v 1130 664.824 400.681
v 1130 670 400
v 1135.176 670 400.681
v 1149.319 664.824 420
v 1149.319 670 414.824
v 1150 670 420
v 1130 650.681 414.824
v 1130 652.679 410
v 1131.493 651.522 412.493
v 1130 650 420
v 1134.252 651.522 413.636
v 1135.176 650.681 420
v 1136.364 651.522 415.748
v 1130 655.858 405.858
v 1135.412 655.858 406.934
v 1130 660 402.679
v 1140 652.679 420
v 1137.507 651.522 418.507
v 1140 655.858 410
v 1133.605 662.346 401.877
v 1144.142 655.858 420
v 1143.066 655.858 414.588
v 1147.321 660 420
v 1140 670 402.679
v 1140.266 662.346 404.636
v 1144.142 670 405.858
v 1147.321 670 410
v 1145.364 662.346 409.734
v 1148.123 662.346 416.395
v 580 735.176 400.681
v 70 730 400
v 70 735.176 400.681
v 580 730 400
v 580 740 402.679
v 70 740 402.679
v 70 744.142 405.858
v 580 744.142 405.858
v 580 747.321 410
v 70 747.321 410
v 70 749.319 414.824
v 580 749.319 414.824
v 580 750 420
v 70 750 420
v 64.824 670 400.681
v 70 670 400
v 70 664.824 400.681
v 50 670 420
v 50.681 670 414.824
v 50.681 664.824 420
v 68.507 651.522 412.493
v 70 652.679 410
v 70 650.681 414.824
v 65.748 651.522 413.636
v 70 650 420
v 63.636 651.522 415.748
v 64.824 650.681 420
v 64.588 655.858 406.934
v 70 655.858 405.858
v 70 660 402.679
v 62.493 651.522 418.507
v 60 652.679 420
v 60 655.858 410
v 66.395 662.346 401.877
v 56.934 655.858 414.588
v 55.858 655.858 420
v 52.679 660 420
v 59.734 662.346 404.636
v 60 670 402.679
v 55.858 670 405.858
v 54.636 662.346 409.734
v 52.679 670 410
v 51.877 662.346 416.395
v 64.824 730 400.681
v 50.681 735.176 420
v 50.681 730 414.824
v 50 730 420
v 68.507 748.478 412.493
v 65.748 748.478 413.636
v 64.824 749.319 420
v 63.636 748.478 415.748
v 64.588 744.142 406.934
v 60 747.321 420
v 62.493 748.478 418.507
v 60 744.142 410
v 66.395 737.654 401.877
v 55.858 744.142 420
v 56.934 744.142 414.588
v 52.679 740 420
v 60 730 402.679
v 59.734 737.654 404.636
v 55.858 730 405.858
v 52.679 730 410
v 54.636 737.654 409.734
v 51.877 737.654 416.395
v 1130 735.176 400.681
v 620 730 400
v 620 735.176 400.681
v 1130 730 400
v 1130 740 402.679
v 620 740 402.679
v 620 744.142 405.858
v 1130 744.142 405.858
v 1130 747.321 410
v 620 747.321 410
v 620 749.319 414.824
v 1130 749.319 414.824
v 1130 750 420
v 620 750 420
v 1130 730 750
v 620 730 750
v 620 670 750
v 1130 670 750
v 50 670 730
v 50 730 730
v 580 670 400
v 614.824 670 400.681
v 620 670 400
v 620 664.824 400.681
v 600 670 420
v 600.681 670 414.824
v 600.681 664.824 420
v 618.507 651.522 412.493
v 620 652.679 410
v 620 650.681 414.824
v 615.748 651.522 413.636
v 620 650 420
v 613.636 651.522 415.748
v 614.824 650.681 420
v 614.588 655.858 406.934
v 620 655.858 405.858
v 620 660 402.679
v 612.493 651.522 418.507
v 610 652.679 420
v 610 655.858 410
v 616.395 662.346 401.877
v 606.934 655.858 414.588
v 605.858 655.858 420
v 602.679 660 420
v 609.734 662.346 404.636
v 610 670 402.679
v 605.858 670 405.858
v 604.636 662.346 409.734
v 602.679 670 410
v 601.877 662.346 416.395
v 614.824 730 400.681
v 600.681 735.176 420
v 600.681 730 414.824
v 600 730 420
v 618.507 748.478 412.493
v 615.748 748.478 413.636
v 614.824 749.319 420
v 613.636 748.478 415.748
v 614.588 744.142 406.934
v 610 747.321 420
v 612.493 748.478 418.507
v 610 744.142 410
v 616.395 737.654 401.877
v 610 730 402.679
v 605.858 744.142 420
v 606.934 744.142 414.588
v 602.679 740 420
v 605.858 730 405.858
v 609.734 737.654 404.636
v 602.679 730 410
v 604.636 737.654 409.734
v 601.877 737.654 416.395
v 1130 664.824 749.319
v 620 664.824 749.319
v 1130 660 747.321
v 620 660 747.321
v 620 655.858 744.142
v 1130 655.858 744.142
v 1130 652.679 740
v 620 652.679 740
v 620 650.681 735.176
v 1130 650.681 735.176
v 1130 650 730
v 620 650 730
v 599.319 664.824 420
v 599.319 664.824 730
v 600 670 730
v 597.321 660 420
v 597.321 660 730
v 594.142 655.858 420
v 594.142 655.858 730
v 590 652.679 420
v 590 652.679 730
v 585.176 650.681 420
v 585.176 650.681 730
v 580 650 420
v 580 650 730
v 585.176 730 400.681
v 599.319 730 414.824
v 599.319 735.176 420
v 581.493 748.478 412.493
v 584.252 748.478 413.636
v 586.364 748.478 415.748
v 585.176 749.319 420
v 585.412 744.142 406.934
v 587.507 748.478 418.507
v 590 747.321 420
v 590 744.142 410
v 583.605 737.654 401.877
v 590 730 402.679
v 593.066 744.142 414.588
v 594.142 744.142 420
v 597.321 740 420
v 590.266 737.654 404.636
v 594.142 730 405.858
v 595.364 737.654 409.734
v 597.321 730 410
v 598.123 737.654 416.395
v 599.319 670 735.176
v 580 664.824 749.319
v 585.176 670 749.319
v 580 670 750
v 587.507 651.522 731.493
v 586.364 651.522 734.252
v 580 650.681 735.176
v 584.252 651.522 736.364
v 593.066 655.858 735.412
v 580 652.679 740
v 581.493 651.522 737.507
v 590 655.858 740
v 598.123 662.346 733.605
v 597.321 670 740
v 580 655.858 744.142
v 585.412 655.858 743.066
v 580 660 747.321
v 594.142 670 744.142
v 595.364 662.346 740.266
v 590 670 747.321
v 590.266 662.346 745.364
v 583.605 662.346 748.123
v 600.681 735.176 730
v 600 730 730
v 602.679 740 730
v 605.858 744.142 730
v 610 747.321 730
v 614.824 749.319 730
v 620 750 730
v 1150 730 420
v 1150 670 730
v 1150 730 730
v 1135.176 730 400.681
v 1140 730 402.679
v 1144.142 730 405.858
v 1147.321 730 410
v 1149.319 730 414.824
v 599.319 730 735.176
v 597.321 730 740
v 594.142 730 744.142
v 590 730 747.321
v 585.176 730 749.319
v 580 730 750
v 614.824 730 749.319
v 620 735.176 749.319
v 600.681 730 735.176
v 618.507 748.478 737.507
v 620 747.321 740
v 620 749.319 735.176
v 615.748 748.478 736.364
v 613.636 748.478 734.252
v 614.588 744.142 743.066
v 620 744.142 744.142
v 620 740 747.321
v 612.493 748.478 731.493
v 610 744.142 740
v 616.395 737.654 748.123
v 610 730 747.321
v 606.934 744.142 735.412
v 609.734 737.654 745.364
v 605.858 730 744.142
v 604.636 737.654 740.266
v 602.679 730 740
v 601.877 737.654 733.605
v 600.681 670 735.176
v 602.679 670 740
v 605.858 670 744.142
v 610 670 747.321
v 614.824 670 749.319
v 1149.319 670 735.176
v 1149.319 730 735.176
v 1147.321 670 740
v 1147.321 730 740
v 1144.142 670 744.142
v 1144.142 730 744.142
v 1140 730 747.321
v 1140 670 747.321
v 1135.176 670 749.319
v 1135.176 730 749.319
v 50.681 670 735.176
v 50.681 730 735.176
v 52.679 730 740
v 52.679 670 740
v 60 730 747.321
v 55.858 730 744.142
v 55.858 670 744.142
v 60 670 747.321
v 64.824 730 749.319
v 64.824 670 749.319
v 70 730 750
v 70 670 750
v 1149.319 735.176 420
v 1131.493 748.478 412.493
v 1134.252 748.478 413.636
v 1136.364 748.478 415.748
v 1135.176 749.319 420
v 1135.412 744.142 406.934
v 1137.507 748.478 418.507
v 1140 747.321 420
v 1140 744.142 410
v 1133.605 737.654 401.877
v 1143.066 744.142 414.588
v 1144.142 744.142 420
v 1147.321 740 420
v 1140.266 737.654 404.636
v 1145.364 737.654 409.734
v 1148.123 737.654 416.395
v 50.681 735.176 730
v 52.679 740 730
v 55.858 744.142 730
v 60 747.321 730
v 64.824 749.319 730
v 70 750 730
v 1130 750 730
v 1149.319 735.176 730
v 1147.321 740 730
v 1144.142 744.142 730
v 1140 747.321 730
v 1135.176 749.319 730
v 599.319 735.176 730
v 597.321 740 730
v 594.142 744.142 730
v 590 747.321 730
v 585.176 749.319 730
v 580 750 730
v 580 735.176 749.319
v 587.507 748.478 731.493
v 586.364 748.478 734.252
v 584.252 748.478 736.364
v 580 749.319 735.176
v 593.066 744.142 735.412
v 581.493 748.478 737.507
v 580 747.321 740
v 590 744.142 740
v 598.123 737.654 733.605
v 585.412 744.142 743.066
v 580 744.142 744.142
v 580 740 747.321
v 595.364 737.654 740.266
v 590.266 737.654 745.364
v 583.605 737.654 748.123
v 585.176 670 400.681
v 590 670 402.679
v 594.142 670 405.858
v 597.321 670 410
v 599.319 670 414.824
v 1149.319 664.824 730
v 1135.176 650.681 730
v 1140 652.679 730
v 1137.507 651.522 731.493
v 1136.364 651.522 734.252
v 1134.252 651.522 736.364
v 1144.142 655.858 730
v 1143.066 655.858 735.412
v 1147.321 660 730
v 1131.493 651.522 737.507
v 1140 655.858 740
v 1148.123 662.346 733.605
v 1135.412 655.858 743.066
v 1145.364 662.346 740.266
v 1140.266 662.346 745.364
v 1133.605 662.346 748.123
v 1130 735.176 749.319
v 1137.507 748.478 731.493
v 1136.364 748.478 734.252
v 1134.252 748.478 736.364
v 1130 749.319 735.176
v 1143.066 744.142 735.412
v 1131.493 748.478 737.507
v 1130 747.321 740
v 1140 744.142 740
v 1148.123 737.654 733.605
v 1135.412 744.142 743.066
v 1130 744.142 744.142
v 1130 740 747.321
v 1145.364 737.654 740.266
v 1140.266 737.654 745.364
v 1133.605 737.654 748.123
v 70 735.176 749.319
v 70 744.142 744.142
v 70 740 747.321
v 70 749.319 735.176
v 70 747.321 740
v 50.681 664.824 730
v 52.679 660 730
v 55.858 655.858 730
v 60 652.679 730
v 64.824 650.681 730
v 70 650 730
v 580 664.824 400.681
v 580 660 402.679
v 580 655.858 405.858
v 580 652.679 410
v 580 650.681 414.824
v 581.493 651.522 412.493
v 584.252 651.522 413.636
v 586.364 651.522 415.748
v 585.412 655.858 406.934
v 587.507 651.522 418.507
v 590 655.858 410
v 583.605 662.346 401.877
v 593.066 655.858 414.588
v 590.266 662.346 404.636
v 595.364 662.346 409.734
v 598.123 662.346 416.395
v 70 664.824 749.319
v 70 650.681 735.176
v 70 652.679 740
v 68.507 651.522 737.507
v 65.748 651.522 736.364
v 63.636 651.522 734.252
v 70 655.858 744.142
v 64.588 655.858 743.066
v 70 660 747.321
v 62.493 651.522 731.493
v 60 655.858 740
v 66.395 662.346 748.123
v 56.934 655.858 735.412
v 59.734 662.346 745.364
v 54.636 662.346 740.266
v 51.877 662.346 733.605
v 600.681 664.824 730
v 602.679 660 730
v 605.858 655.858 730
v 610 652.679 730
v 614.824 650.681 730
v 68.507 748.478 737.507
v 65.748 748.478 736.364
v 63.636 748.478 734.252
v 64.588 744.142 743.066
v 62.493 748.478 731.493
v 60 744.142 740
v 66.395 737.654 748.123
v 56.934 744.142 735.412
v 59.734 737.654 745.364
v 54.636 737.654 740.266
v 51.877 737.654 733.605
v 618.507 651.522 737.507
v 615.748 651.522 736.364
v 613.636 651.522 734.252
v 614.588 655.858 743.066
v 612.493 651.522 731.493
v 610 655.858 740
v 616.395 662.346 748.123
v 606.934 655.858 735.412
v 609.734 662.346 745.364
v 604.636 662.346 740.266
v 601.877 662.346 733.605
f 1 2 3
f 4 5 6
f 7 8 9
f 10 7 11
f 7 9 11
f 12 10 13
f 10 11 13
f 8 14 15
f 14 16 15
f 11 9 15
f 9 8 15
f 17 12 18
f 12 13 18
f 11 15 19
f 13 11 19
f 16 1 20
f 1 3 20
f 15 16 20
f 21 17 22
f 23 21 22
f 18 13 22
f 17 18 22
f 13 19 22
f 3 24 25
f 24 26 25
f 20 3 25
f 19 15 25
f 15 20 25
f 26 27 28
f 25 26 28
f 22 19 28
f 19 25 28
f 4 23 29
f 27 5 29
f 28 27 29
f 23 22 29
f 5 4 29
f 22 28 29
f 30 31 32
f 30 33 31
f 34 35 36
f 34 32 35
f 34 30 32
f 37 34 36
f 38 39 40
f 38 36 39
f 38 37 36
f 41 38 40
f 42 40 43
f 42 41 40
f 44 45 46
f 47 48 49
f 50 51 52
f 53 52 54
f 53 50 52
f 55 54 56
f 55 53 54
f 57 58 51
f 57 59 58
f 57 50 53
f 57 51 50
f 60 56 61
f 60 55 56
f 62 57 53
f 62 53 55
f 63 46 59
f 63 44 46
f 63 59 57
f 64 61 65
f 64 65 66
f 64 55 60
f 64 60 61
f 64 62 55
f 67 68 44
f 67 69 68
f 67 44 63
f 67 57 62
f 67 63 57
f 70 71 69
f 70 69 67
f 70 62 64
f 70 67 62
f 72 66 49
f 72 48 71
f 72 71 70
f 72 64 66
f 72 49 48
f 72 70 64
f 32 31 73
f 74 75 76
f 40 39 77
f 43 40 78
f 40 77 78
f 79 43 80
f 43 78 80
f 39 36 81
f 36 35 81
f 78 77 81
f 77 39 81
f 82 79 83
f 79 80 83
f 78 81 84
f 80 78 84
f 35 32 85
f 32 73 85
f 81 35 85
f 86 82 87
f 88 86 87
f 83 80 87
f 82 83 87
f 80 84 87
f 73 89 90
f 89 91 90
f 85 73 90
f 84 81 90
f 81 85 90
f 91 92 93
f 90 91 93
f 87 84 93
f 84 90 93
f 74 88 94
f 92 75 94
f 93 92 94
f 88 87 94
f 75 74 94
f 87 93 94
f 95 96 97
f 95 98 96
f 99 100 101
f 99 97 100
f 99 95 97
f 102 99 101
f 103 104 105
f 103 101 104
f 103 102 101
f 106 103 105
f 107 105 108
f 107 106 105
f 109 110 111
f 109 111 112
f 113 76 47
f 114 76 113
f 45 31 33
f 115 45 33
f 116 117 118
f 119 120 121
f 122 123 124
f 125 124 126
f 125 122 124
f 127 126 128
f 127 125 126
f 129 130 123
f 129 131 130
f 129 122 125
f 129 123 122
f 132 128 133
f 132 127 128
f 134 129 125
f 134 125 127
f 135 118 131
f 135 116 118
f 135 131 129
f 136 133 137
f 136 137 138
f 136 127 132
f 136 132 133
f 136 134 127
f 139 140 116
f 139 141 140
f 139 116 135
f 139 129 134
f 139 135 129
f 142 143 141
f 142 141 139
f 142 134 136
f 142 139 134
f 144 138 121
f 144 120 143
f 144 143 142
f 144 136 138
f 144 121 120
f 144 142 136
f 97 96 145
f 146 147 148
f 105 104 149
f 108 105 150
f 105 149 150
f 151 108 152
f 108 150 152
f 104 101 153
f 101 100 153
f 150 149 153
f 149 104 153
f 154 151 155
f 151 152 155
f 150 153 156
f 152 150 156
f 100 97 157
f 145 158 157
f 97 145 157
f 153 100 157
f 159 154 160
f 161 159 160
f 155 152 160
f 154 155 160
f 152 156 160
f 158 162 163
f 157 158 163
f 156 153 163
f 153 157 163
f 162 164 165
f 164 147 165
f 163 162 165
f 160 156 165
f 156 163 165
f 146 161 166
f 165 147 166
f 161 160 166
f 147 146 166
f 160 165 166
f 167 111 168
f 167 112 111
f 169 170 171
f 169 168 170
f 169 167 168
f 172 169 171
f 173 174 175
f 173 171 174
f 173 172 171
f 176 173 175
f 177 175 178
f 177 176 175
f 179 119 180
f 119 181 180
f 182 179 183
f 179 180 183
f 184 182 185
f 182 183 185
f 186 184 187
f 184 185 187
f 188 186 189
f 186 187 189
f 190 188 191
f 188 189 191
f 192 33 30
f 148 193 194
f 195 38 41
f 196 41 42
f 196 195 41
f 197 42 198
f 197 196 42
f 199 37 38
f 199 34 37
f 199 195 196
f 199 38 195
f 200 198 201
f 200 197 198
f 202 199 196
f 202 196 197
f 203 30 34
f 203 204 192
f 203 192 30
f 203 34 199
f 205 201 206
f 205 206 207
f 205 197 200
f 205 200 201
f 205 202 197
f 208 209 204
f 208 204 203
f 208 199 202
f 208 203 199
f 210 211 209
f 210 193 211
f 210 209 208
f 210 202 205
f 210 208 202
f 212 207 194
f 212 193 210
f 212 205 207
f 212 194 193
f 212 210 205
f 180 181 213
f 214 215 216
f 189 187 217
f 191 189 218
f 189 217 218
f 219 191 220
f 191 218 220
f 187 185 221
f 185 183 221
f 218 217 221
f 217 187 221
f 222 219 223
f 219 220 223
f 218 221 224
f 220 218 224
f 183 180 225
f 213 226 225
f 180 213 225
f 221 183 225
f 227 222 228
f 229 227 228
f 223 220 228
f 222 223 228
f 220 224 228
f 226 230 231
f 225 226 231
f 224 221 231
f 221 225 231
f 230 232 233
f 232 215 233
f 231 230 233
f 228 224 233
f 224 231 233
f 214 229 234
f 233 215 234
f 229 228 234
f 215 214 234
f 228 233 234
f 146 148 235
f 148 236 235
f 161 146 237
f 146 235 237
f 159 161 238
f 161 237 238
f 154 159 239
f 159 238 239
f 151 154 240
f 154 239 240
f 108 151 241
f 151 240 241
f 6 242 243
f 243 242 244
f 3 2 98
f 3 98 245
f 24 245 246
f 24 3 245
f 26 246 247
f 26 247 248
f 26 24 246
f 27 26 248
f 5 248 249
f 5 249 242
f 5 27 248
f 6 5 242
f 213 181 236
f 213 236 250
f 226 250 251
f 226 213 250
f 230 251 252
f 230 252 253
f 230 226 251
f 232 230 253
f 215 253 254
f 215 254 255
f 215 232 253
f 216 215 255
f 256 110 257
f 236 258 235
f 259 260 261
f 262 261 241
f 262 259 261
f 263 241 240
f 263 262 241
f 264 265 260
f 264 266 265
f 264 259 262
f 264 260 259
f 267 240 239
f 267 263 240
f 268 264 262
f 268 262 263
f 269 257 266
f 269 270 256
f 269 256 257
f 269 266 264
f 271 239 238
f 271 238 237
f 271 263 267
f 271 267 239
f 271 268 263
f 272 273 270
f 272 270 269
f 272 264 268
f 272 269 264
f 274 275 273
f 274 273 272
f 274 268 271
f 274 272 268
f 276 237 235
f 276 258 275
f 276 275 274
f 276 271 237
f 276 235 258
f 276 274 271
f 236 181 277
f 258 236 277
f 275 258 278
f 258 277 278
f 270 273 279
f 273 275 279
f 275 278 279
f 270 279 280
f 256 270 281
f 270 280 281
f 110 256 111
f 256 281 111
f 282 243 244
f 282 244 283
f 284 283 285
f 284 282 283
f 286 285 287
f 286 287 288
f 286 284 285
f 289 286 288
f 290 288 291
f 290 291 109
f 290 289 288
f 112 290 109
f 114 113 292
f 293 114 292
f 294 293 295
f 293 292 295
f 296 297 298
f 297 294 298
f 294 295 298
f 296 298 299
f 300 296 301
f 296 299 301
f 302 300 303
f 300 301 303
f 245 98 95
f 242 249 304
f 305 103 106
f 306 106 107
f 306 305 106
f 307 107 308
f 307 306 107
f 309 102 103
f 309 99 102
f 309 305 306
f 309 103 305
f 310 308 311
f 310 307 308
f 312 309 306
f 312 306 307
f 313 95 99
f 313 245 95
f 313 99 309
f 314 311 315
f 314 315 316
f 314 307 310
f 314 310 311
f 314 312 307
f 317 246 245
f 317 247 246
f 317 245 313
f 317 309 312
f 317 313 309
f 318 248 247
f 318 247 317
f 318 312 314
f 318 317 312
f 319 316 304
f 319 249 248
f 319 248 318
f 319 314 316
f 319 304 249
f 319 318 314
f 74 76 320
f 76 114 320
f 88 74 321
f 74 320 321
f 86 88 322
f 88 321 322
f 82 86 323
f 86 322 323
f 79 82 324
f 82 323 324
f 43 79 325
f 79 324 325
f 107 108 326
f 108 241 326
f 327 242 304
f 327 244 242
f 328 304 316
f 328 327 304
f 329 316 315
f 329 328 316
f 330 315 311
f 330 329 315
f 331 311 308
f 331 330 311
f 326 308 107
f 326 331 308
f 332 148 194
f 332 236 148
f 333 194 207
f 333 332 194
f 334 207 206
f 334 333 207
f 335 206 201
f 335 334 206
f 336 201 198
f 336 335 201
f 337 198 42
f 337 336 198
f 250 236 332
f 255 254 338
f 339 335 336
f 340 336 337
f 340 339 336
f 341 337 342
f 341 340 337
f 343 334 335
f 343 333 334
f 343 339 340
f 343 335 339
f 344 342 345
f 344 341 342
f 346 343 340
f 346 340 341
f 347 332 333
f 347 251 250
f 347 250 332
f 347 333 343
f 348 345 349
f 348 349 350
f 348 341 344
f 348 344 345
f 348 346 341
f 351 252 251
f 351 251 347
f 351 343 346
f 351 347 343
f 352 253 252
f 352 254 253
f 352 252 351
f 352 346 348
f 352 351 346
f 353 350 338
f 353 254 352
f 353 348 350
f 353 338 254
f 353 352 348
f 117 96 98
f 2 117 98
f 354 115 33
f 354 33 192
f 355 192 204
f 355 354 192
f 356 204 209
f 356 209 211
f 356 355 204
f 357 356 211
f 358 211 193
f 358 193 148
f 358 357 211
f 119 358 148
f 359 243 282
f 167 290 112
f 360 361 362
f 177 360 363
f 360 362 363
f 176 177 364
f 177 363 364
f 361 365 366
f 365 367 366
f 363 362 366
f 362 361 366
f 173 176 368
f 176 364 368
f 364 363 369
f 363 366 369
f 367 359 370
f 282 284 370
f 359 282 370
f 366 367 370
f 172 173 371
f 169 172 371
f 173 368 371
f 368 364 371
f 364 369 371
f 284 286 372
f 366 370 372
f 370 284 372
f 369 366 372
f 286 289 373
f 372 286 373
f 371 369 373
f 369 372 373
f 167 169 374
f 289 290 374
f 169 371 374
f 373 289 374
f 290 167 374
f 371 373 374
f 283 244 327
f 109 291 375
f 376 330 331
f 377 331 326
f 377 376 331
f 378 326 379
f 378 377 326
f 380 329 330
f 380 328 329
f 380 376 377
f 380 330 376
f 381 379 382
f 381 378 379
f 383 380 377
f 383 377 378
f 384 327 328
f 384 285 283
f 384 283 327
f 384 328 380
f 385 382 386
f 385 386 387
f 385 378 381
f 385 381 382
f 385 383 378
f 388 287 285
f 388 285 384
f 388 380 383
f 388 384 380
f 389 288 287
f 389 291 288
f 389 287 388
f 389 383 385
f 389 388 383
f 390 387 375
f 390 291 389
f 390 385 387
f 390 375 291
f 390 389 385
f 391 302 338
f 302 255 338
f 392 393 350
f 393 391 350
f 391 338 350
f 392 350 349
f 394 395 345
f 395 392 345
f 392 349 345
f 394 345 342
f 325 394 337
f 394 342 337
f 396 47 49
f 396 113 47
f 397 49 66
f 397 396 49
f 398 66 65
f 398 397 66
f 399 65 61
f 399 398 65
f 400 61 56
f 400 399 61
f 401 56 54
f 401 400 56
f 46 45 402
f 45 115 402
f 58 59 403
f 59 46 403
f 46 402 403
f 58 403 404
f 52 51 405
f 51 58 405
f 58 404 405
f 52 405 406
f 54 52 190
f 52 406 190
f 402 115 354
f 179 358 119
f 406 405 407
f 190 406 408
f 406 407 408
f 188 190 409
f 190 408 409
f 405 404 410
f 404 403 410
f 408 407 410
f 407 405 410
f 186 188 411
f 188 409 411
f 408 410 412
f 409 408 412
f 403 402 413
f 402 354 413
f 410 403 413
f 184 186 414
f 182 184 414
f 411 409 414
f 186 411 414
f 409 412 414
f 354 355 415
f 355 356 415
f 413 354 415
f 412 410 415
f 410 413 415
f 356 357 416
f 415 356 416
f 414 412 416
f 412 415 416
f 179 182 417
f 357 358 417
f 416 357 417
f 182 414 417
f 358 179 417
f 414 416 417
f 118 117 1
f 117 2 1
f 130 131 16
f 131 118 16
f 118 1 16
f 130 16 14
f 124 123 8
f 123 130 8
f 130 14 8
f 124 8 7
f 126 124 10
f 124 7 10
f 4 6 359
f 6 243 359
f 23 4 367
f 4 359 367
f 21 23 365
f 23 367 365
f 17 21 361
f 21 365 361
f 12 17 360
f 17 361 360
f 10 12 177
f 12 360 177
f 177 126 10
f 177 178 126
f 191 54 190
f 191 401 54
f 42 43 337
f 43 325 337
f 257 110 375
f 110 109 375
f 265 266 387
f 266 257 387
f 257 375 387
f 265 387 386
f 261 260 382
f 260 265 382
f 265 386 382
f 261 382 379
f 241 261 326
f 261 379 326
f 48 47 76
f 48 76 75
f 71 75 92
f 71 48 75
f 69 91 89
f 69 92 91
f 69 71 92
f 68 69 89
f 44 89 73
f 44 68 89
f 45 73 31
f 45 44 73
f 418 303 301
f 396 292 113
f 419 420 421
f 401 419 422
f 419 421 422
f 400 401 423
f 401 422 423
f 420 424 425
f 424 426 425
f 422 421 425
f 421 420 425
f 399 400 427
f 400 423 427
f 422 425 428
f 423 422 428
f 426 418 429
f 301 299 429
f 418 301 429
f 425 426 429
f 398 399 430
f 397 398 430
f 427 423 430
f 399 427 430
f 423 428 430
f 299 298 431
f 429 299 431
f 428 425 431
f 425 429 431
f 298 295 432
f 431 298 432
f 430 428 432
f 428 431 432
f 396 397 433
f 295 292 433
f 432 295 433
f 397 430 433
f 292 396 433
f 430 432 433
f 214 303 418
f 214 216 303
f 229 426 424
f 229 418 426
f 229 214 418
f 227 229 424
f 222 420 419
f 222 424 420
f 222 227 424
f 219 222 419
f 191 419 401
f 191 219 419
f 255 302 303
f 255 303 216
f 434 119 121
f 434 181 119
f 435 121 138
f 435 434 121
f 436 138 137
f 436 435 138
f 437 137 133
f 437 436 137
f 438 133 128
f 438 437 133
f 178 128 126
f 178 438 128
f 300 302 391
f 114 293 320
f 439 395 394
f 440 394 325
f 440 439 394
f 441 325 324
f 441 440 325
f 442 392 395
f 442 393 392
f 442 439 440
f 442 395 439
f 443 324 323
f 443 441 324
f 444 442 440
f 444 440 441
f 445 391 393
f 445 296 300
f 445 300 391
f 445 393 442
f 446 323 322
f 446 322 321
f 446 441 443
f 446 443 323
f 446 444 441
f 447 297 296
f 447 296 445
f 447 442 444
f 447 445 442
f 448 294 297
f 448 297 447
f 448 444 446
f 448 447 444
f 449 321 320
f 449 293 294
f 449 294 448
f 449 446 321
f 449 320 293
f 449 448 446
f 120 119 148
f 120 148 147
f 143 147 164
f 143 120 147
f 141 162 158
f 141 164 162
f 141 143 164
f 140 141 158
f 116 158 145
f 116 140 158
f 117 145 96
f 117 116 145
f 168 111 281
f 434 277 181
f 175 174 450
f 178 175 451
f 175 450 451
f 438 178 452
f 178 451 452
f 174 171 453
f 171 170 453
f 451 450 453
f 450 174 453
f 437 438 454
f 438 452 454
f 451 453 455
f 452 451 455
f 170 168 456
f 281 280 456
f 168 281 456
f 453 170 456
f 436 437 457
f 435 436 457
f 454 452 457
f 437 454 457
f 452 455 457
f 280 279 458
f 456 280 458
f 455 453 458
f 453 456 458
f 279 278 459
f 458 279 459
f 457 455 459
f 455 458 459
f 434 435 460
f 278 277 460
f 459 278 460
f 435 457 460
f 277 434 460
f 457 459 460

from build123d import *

# Parameters (mm, degrees)
SKETCH005_W      = 550
SKETCH005_H      = 350
EXTRUDE006_DEPTH = 100
FILLET001_R      = 20
ARRAY003_X_COUNT = 2
ARRAY003_X_PITCH = 550


with BuildPart() as part:
    # Sketch005 → Extrude006 (new body)
    with BuildSketch(Plane.XZ):
        with Locations((275, 175)):
            Rectangle(SKETCH005_W, SKETCH005_H)
    extrude(amount=EXTRUDE006_DEPTH)

    # Fillet001
    fillet001_edges = [part.edges().sort_by_distance(p)[0] for p in [
        (0, -50, 0),
        (550, -50, 0),
        (275, 0, 0),
        (275, -100, 0),
        (550, -50, 350),
        (550, 0, 175),
        (550, -100, 175),
        (0, -50, 350),
        (275, 0, 350),
        (275, -100, 350),
        (0, 0, 175),
        (0, -100, 175),
    ]]
    fillet(fillet001_edges, radius=FILLET001_R)

    # Array003 X: part ×2


with BuildPart() as part_1:
    add(part.part)
    with Locations(*[(i * ARRAY003_X_PITCH, 0, 0) for i in range(1, ARRAY003_X_COUNT)]):
        add(part.part)


with BuildPart() as part_2:
    # Array003 placement: moved
    add(part_1.part.moved(Location((50, 750, 400))))


solid = part_2.part
